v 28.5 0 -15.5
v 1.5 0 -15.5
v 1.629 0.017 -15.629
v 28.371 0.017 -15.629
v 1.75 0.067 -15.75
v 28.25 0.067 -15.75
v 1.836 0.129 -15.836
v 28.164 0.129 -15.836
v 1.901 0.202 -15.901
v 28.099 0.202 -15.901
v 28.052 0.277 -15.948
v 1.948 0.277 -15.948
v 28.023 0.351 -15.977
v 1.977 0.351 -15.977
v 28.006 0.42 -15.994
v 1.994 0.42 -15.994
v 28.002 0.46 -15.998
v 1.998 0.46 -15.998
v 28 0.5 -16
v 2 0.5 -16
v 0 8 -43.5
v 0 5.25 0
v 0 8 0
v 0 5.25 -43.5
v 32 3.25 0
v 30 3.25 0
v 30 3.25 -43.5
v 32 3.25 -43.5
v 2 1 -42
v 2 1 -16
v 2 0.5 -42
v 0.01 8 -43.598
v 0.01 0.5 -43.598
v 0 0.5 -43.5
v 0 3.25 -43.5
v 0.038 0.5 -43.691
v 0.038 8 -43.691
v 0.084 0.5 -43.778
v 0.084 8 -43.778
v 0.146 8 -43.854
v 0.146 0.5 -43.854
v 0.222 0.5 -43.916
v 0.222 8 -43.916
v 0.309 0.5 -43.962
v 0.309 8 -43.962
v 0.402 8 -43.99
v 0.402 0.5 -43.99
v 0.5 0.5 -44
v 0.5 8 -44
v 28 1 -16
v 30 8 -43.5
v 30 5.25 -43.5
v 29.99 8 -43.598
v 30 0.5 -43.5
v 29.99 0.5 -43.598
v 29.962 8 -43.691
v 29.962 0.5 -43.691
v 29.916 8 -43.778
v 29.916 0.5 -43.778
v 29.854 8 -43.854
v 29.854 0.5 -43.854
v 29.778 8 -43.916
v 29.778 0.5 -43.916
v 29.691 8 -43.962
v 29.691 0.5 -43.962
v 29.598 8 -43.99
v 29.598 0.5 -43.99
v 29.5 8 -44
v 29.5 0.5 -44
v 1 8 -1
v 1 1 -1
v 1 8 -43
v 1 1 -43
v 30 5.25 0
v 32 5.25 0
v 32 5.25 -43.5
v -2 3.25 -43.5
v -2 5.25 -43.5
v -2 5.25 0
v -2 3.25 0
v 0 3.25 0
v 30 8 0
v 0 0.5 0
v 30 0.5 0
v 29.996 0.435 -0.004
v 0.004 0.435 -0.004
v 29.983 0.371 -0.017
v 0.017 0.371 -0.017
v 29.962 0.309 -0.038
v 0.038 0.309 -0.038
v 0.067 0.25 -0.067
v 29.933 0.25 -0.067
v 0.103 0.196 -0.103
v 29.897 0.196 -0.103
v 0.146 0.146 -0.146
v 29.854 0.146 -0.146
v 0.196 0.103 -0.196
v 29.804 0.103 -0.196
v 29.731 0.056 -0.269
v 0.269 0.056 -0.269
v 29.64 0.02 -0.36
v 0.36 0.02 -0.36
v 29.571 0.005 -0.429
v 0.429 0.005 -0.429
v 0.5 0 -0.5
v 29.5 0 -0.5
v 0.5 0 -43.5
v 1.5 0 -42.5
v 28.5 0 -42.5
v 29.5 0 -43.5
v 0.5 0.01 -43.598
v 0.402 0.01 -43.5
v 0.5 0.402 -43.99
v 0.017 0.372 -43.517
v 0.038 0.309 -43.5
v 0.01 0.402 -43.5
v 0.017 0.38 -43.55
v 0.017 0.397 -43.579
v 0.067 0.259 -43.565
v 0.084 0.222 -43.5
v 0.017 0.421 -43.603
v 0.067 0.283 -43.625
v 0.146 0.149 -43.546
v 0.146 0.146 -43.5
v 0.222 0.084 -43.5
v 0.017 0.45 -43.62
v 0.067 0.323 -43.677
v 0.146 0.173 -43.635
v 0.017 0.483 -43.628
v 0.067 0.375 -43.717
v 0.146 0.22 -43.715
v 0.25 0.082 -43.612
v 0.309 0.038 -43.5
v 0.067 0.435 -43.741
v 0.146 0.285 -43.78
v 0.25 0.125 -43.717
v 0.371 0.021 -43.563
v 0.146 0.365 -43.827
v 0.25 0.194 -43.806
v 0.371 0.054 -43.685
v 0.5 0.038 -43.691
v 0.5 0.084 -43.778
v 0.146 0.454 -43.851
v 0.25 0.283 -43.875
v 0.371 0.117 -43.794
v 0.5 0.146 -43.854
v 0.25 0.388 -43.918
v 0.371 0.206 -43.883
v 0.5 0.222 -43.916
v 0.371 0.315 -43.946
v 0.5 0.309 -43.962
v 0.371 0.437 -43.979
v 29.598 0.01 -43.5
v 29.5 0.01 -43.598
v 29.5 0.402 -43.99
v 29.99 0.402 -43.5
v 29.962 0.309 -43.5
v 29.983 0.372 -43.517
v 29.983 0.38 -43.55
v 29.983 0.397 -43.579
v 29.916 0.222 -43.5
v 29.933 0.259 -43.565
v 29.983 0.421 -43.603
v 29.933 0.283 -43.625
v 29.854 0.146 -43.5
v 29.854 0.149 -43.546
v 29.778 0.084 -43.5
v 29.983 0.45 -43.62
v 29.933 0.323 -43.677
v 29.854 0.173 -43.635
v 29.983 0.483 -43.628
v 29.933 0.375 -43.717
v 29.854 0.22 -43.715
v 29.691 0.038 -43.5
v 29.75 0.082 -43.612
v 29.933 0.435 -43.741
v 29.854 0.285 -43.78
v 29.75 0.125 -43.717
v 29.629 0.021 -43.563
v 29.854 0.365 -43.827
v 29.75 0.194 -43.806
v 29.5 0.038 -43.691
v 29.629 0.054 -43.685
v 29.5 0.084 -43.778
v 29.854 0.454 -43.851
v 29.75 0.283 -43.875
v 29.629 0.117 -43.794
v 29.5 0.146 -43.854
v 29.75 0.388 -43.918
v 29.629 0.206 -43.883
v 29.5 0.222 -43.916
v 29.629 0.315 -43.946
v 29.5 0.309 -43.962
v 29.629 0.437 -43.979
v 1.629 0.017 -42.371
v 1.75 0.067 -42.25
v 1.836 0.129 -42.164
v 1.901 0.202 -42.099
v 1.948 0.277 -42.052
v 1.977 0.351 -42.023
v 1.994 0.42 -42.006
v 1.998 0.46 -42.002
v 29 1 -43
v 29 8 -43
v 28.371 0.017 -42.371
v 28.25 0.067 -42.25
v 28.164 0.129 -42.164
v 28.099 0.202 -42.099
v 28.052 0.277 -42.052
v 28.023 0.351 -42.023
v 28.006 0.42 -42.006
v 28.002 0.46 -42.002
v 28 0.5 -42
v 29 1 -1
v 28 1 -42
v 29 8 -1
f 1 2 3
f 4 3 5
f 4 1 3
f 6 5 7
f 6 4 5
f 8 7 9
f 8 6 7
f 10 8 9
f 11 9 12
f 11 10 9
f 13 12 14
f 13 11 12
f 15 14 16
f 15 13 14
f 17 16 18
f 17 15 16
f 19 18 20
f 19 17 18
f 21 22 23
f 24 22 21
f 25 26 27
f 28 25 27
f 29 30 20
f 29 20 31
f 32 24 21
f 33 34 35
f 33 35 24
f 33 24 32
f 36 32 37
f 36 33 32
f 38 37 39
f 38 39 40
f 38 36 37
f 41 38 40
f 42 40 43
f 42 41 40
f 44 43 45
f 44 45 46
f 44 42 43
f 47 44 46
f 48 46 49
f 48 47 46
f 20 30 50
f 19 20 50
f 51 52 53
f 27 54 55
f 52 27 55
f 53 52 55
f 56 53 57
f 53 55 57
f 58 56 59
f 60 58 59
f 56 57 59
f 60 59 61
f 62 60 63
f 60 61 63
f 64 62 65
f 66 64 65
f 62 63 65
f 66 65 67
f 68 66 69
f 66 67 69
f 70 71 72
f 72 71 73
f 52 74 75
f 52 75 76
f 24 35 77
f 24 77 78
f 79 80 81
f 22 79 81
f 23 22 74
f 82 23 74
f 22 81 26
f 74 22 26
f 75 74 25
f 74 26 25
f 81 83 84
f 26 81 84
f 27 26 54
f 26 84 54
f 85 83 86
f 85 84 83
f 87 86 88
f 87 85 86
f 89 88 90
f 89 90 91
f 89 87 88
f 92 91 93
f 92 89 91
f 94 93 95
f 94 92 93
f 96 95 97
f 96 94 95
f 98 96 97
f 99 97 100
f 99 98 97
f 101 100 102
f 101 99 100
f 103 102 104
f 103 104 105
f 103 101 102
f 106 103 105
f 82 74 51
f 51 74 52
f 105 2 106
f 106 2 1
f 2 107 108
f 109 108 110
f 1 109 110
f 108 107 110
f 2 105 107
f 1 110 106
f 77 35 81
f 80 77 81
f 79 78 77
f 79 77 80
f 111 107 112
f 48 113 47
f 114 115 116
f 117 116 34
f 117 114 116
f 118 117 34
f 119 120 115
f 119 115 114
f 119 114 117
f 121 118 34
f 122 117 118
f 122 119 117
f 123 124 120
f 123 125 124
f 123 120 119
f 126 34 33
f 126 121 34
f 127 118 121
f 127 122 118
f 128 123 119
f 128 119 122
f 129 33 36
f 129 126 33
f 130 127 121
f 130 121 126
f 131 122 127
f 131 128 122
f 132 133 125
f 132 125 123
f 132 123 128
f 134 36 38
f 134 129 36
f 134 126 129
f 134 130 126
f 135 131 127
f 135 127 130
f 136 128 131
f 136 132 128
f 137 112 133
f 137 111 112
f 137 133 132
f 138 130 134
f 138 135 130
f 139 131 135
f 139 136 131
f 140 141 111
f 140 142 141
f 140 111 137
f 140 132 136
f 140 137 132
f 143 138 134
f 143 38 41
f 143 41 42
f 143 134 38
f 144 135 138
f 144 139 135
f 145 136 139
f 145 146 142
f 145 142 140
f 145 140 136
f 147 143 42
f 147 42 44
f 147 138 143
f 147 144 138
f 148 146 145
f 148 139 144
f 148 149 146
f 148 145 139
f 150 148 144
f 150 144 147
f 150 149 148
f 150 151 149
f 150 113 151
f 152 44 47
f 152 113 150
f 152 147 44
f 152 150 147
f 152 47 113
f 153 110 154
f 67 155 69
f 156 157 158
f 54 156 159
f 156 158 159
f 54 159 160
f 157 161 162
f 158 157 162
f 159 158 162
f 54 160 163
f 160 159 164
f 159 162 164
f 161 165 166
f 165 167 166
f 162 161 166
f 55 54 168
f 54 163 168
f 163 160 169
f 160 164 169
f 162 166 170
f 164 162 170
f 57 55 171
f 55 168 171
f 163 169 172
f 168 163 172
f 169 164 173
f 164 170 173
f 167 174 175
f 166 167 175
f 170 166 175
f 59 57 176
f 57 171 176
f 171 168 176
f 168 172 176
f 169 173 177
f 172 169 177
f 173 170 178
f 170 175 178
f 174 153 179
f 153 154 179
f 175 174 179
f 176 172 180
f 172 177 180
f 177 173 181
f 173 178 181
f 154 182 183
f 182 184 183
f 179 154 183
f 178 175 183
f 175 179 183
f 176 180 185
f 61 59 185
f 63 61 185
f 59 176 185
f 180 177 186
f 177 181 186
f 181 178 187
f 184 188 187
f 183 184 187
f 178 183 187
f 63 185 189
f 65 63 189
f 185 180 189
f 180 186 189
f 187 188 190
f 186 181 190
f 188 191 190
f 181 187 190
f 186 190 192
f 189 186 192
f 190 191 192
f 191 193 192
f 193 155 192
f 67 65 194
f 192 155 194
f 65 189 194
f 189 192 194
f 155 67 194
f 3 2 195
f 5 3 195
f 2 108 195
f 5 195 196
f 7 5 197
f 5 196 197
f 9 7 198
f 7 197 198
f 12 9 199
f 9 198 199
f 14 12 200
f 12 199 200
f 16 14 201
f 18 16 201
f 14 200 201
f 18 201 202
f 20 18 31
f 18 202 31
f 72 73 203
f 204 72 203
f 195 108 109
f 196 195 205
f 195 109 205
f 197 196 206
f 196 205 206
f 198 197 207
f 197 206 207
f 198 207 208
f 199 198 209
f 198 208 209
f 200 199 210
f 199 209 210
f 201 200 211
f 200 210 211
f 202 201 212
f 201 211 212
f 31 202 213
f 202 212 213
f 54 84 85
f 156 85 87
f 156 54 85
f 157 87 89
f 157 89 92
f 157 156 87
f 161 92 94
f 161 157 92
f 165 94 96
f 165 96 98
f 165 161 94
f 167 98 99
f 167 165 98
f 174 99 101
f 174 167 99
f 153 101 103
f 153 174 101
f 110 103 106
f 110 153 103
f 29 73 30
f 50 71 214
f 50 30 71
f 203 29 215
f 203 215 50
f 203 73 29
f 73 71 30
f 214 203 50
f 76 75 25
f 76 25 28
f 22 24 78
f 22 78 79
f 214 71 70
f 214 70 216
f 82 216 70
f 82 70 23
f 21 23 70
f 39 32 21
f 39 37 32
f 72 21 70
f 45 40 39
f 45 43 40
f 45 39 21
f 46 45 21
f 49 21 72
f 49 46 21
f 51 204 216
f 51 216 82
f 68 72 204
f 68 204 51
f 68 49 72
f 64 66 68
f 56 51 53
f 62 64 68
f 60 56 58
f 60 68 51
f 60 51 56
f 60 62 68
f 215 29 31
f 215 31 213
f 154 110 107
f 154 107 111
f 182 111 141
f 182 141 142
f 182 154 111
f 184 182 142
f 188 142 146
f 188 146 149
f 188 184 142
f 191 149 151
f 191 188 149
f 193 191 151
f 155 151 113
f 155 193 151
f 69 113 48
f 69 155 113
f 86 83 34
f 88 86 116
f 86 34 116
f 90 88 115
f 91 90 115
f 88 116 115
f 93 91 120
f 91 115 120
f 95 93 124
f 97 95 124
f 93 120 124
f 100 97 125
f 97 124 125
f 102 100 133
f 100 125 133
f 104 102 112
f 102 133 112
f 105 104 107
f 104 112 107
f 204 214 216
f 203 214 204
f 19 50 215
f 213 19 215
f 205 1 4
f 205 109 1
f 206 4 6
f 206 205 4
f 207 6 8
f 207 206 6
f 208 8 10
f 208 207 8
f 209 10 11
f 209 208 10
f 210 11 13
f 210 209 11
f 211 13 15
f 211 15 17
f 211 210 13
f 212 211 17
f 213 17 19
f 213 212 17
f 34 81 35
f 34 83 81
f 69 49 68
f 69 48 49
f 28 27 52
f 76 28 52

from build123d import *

# Parameters (mm, degrees)
SKETCH1_W           = 30
SKETCH1_H           = 44
BOSS_EXTRUDE3_DEPTH = 1
SKETCH3_W           = 26
SKETCH3_H           = 26
CUT_EXTRUDE1_DEPTH  = 1
SKETCH4_W           = 30
SKETCH4_H           = 44
SKETCH4_W_2         = 28
SKETCH4_H_2         = 42
BOSS_EXTRUDE4_DEPTH = 7
FILLET1_R           = 0.5
SKETCH5_W           = 43.5
SKETCH5_H           = 2
BOSS_EXTRUDE5_DEPTH = 2
SKETCH6_W           = 43.5
SKETCH6_H           = 2
BOSS_EXTRUDE6_DEPTH = 2


with BuildPart() as part:
    # Sketch1 → Boss-Extrude3 (new body)
    with BuildSketch(Plane(origin=(0, 0, 0), x_dir=(1, 0, 0), z_dir=(0, 1, 0))):
        with Locations((15, 22)):
            Rectangle(SKETCH1_W, SKETCH1_H)
    extrude(amount=BOSS_EXTRUDE3_DEPTH)

    # Sketch3 → Cut-Extrude1 (cut)
    with BuildSketch(Plane(origin=(0, 1, 0), x_dir=(1, 0, 0), z_dir=(0, 1, 0))):
        with Locations((15, 29)):
            Rectangle(SKETCH3_W, SKETCH3_H)
    extrude(amount=-CUT_EXTRUDE1_DEPTH, mode=Mode.SUBTRACT)

    # Sketch4 → Boss-Extrude4 (add)
    with BuildSketch(Plane(origin=(0, 1, 0), x_dir=(1, 0, 0), z_dir=(0, 1, 0))):
        with Locations((15, 22)):
            Rectangle(SKETCH4_W, SKETCH4_H)
        with Locations((15, 22)):
            Rectangle(SKETCH4_W_2, SKETCH4_H_2, mode=Mode.SUBTRACT)
    extrude(amount=BOSS_EXTRUDE4_DEPTH)

    # Fillet1
    fillet1_edges = [part.edges().sort_by_distance(p)[0] for p in [
        (2, 0, -29),
        (15, 0, -42),
        (28, 0, -29),
        (15, 0, -16),
        (15, 0, -44),
        (30, 0, -22),
        (15, 0, 0),
        (0, 0, -22),
        (0, 4, -44),
        (30, 4, -44),
    ]]
    fillet(fillet1_edges, radius=FILLET1_R)

    # Sketch5 → Boss-Extrude5 (add)
    with BuildSketch(Plane.ZY):
        with Locations((-21.75, 4.25)):
            Rectangle(SKETCH5_W, SKETCH5_H)
    extrude(amount=BOSS_EXTRUDE5_DEPTH)

    # Sketch6 → Boss-Extrude6 (add)
    with BuildSketch(Plane(origin=(30, 0, 0), x_dir=(0, 0, -1), z_dir=(1, 0, 0))):
        with Locations((21.75, 4.25)):
            Rectangle(SKETCH6_W, SKETCH6_H)
    extrude(amount=BOSS_EXTRUDE6_DEPTH)


solid = part.part
